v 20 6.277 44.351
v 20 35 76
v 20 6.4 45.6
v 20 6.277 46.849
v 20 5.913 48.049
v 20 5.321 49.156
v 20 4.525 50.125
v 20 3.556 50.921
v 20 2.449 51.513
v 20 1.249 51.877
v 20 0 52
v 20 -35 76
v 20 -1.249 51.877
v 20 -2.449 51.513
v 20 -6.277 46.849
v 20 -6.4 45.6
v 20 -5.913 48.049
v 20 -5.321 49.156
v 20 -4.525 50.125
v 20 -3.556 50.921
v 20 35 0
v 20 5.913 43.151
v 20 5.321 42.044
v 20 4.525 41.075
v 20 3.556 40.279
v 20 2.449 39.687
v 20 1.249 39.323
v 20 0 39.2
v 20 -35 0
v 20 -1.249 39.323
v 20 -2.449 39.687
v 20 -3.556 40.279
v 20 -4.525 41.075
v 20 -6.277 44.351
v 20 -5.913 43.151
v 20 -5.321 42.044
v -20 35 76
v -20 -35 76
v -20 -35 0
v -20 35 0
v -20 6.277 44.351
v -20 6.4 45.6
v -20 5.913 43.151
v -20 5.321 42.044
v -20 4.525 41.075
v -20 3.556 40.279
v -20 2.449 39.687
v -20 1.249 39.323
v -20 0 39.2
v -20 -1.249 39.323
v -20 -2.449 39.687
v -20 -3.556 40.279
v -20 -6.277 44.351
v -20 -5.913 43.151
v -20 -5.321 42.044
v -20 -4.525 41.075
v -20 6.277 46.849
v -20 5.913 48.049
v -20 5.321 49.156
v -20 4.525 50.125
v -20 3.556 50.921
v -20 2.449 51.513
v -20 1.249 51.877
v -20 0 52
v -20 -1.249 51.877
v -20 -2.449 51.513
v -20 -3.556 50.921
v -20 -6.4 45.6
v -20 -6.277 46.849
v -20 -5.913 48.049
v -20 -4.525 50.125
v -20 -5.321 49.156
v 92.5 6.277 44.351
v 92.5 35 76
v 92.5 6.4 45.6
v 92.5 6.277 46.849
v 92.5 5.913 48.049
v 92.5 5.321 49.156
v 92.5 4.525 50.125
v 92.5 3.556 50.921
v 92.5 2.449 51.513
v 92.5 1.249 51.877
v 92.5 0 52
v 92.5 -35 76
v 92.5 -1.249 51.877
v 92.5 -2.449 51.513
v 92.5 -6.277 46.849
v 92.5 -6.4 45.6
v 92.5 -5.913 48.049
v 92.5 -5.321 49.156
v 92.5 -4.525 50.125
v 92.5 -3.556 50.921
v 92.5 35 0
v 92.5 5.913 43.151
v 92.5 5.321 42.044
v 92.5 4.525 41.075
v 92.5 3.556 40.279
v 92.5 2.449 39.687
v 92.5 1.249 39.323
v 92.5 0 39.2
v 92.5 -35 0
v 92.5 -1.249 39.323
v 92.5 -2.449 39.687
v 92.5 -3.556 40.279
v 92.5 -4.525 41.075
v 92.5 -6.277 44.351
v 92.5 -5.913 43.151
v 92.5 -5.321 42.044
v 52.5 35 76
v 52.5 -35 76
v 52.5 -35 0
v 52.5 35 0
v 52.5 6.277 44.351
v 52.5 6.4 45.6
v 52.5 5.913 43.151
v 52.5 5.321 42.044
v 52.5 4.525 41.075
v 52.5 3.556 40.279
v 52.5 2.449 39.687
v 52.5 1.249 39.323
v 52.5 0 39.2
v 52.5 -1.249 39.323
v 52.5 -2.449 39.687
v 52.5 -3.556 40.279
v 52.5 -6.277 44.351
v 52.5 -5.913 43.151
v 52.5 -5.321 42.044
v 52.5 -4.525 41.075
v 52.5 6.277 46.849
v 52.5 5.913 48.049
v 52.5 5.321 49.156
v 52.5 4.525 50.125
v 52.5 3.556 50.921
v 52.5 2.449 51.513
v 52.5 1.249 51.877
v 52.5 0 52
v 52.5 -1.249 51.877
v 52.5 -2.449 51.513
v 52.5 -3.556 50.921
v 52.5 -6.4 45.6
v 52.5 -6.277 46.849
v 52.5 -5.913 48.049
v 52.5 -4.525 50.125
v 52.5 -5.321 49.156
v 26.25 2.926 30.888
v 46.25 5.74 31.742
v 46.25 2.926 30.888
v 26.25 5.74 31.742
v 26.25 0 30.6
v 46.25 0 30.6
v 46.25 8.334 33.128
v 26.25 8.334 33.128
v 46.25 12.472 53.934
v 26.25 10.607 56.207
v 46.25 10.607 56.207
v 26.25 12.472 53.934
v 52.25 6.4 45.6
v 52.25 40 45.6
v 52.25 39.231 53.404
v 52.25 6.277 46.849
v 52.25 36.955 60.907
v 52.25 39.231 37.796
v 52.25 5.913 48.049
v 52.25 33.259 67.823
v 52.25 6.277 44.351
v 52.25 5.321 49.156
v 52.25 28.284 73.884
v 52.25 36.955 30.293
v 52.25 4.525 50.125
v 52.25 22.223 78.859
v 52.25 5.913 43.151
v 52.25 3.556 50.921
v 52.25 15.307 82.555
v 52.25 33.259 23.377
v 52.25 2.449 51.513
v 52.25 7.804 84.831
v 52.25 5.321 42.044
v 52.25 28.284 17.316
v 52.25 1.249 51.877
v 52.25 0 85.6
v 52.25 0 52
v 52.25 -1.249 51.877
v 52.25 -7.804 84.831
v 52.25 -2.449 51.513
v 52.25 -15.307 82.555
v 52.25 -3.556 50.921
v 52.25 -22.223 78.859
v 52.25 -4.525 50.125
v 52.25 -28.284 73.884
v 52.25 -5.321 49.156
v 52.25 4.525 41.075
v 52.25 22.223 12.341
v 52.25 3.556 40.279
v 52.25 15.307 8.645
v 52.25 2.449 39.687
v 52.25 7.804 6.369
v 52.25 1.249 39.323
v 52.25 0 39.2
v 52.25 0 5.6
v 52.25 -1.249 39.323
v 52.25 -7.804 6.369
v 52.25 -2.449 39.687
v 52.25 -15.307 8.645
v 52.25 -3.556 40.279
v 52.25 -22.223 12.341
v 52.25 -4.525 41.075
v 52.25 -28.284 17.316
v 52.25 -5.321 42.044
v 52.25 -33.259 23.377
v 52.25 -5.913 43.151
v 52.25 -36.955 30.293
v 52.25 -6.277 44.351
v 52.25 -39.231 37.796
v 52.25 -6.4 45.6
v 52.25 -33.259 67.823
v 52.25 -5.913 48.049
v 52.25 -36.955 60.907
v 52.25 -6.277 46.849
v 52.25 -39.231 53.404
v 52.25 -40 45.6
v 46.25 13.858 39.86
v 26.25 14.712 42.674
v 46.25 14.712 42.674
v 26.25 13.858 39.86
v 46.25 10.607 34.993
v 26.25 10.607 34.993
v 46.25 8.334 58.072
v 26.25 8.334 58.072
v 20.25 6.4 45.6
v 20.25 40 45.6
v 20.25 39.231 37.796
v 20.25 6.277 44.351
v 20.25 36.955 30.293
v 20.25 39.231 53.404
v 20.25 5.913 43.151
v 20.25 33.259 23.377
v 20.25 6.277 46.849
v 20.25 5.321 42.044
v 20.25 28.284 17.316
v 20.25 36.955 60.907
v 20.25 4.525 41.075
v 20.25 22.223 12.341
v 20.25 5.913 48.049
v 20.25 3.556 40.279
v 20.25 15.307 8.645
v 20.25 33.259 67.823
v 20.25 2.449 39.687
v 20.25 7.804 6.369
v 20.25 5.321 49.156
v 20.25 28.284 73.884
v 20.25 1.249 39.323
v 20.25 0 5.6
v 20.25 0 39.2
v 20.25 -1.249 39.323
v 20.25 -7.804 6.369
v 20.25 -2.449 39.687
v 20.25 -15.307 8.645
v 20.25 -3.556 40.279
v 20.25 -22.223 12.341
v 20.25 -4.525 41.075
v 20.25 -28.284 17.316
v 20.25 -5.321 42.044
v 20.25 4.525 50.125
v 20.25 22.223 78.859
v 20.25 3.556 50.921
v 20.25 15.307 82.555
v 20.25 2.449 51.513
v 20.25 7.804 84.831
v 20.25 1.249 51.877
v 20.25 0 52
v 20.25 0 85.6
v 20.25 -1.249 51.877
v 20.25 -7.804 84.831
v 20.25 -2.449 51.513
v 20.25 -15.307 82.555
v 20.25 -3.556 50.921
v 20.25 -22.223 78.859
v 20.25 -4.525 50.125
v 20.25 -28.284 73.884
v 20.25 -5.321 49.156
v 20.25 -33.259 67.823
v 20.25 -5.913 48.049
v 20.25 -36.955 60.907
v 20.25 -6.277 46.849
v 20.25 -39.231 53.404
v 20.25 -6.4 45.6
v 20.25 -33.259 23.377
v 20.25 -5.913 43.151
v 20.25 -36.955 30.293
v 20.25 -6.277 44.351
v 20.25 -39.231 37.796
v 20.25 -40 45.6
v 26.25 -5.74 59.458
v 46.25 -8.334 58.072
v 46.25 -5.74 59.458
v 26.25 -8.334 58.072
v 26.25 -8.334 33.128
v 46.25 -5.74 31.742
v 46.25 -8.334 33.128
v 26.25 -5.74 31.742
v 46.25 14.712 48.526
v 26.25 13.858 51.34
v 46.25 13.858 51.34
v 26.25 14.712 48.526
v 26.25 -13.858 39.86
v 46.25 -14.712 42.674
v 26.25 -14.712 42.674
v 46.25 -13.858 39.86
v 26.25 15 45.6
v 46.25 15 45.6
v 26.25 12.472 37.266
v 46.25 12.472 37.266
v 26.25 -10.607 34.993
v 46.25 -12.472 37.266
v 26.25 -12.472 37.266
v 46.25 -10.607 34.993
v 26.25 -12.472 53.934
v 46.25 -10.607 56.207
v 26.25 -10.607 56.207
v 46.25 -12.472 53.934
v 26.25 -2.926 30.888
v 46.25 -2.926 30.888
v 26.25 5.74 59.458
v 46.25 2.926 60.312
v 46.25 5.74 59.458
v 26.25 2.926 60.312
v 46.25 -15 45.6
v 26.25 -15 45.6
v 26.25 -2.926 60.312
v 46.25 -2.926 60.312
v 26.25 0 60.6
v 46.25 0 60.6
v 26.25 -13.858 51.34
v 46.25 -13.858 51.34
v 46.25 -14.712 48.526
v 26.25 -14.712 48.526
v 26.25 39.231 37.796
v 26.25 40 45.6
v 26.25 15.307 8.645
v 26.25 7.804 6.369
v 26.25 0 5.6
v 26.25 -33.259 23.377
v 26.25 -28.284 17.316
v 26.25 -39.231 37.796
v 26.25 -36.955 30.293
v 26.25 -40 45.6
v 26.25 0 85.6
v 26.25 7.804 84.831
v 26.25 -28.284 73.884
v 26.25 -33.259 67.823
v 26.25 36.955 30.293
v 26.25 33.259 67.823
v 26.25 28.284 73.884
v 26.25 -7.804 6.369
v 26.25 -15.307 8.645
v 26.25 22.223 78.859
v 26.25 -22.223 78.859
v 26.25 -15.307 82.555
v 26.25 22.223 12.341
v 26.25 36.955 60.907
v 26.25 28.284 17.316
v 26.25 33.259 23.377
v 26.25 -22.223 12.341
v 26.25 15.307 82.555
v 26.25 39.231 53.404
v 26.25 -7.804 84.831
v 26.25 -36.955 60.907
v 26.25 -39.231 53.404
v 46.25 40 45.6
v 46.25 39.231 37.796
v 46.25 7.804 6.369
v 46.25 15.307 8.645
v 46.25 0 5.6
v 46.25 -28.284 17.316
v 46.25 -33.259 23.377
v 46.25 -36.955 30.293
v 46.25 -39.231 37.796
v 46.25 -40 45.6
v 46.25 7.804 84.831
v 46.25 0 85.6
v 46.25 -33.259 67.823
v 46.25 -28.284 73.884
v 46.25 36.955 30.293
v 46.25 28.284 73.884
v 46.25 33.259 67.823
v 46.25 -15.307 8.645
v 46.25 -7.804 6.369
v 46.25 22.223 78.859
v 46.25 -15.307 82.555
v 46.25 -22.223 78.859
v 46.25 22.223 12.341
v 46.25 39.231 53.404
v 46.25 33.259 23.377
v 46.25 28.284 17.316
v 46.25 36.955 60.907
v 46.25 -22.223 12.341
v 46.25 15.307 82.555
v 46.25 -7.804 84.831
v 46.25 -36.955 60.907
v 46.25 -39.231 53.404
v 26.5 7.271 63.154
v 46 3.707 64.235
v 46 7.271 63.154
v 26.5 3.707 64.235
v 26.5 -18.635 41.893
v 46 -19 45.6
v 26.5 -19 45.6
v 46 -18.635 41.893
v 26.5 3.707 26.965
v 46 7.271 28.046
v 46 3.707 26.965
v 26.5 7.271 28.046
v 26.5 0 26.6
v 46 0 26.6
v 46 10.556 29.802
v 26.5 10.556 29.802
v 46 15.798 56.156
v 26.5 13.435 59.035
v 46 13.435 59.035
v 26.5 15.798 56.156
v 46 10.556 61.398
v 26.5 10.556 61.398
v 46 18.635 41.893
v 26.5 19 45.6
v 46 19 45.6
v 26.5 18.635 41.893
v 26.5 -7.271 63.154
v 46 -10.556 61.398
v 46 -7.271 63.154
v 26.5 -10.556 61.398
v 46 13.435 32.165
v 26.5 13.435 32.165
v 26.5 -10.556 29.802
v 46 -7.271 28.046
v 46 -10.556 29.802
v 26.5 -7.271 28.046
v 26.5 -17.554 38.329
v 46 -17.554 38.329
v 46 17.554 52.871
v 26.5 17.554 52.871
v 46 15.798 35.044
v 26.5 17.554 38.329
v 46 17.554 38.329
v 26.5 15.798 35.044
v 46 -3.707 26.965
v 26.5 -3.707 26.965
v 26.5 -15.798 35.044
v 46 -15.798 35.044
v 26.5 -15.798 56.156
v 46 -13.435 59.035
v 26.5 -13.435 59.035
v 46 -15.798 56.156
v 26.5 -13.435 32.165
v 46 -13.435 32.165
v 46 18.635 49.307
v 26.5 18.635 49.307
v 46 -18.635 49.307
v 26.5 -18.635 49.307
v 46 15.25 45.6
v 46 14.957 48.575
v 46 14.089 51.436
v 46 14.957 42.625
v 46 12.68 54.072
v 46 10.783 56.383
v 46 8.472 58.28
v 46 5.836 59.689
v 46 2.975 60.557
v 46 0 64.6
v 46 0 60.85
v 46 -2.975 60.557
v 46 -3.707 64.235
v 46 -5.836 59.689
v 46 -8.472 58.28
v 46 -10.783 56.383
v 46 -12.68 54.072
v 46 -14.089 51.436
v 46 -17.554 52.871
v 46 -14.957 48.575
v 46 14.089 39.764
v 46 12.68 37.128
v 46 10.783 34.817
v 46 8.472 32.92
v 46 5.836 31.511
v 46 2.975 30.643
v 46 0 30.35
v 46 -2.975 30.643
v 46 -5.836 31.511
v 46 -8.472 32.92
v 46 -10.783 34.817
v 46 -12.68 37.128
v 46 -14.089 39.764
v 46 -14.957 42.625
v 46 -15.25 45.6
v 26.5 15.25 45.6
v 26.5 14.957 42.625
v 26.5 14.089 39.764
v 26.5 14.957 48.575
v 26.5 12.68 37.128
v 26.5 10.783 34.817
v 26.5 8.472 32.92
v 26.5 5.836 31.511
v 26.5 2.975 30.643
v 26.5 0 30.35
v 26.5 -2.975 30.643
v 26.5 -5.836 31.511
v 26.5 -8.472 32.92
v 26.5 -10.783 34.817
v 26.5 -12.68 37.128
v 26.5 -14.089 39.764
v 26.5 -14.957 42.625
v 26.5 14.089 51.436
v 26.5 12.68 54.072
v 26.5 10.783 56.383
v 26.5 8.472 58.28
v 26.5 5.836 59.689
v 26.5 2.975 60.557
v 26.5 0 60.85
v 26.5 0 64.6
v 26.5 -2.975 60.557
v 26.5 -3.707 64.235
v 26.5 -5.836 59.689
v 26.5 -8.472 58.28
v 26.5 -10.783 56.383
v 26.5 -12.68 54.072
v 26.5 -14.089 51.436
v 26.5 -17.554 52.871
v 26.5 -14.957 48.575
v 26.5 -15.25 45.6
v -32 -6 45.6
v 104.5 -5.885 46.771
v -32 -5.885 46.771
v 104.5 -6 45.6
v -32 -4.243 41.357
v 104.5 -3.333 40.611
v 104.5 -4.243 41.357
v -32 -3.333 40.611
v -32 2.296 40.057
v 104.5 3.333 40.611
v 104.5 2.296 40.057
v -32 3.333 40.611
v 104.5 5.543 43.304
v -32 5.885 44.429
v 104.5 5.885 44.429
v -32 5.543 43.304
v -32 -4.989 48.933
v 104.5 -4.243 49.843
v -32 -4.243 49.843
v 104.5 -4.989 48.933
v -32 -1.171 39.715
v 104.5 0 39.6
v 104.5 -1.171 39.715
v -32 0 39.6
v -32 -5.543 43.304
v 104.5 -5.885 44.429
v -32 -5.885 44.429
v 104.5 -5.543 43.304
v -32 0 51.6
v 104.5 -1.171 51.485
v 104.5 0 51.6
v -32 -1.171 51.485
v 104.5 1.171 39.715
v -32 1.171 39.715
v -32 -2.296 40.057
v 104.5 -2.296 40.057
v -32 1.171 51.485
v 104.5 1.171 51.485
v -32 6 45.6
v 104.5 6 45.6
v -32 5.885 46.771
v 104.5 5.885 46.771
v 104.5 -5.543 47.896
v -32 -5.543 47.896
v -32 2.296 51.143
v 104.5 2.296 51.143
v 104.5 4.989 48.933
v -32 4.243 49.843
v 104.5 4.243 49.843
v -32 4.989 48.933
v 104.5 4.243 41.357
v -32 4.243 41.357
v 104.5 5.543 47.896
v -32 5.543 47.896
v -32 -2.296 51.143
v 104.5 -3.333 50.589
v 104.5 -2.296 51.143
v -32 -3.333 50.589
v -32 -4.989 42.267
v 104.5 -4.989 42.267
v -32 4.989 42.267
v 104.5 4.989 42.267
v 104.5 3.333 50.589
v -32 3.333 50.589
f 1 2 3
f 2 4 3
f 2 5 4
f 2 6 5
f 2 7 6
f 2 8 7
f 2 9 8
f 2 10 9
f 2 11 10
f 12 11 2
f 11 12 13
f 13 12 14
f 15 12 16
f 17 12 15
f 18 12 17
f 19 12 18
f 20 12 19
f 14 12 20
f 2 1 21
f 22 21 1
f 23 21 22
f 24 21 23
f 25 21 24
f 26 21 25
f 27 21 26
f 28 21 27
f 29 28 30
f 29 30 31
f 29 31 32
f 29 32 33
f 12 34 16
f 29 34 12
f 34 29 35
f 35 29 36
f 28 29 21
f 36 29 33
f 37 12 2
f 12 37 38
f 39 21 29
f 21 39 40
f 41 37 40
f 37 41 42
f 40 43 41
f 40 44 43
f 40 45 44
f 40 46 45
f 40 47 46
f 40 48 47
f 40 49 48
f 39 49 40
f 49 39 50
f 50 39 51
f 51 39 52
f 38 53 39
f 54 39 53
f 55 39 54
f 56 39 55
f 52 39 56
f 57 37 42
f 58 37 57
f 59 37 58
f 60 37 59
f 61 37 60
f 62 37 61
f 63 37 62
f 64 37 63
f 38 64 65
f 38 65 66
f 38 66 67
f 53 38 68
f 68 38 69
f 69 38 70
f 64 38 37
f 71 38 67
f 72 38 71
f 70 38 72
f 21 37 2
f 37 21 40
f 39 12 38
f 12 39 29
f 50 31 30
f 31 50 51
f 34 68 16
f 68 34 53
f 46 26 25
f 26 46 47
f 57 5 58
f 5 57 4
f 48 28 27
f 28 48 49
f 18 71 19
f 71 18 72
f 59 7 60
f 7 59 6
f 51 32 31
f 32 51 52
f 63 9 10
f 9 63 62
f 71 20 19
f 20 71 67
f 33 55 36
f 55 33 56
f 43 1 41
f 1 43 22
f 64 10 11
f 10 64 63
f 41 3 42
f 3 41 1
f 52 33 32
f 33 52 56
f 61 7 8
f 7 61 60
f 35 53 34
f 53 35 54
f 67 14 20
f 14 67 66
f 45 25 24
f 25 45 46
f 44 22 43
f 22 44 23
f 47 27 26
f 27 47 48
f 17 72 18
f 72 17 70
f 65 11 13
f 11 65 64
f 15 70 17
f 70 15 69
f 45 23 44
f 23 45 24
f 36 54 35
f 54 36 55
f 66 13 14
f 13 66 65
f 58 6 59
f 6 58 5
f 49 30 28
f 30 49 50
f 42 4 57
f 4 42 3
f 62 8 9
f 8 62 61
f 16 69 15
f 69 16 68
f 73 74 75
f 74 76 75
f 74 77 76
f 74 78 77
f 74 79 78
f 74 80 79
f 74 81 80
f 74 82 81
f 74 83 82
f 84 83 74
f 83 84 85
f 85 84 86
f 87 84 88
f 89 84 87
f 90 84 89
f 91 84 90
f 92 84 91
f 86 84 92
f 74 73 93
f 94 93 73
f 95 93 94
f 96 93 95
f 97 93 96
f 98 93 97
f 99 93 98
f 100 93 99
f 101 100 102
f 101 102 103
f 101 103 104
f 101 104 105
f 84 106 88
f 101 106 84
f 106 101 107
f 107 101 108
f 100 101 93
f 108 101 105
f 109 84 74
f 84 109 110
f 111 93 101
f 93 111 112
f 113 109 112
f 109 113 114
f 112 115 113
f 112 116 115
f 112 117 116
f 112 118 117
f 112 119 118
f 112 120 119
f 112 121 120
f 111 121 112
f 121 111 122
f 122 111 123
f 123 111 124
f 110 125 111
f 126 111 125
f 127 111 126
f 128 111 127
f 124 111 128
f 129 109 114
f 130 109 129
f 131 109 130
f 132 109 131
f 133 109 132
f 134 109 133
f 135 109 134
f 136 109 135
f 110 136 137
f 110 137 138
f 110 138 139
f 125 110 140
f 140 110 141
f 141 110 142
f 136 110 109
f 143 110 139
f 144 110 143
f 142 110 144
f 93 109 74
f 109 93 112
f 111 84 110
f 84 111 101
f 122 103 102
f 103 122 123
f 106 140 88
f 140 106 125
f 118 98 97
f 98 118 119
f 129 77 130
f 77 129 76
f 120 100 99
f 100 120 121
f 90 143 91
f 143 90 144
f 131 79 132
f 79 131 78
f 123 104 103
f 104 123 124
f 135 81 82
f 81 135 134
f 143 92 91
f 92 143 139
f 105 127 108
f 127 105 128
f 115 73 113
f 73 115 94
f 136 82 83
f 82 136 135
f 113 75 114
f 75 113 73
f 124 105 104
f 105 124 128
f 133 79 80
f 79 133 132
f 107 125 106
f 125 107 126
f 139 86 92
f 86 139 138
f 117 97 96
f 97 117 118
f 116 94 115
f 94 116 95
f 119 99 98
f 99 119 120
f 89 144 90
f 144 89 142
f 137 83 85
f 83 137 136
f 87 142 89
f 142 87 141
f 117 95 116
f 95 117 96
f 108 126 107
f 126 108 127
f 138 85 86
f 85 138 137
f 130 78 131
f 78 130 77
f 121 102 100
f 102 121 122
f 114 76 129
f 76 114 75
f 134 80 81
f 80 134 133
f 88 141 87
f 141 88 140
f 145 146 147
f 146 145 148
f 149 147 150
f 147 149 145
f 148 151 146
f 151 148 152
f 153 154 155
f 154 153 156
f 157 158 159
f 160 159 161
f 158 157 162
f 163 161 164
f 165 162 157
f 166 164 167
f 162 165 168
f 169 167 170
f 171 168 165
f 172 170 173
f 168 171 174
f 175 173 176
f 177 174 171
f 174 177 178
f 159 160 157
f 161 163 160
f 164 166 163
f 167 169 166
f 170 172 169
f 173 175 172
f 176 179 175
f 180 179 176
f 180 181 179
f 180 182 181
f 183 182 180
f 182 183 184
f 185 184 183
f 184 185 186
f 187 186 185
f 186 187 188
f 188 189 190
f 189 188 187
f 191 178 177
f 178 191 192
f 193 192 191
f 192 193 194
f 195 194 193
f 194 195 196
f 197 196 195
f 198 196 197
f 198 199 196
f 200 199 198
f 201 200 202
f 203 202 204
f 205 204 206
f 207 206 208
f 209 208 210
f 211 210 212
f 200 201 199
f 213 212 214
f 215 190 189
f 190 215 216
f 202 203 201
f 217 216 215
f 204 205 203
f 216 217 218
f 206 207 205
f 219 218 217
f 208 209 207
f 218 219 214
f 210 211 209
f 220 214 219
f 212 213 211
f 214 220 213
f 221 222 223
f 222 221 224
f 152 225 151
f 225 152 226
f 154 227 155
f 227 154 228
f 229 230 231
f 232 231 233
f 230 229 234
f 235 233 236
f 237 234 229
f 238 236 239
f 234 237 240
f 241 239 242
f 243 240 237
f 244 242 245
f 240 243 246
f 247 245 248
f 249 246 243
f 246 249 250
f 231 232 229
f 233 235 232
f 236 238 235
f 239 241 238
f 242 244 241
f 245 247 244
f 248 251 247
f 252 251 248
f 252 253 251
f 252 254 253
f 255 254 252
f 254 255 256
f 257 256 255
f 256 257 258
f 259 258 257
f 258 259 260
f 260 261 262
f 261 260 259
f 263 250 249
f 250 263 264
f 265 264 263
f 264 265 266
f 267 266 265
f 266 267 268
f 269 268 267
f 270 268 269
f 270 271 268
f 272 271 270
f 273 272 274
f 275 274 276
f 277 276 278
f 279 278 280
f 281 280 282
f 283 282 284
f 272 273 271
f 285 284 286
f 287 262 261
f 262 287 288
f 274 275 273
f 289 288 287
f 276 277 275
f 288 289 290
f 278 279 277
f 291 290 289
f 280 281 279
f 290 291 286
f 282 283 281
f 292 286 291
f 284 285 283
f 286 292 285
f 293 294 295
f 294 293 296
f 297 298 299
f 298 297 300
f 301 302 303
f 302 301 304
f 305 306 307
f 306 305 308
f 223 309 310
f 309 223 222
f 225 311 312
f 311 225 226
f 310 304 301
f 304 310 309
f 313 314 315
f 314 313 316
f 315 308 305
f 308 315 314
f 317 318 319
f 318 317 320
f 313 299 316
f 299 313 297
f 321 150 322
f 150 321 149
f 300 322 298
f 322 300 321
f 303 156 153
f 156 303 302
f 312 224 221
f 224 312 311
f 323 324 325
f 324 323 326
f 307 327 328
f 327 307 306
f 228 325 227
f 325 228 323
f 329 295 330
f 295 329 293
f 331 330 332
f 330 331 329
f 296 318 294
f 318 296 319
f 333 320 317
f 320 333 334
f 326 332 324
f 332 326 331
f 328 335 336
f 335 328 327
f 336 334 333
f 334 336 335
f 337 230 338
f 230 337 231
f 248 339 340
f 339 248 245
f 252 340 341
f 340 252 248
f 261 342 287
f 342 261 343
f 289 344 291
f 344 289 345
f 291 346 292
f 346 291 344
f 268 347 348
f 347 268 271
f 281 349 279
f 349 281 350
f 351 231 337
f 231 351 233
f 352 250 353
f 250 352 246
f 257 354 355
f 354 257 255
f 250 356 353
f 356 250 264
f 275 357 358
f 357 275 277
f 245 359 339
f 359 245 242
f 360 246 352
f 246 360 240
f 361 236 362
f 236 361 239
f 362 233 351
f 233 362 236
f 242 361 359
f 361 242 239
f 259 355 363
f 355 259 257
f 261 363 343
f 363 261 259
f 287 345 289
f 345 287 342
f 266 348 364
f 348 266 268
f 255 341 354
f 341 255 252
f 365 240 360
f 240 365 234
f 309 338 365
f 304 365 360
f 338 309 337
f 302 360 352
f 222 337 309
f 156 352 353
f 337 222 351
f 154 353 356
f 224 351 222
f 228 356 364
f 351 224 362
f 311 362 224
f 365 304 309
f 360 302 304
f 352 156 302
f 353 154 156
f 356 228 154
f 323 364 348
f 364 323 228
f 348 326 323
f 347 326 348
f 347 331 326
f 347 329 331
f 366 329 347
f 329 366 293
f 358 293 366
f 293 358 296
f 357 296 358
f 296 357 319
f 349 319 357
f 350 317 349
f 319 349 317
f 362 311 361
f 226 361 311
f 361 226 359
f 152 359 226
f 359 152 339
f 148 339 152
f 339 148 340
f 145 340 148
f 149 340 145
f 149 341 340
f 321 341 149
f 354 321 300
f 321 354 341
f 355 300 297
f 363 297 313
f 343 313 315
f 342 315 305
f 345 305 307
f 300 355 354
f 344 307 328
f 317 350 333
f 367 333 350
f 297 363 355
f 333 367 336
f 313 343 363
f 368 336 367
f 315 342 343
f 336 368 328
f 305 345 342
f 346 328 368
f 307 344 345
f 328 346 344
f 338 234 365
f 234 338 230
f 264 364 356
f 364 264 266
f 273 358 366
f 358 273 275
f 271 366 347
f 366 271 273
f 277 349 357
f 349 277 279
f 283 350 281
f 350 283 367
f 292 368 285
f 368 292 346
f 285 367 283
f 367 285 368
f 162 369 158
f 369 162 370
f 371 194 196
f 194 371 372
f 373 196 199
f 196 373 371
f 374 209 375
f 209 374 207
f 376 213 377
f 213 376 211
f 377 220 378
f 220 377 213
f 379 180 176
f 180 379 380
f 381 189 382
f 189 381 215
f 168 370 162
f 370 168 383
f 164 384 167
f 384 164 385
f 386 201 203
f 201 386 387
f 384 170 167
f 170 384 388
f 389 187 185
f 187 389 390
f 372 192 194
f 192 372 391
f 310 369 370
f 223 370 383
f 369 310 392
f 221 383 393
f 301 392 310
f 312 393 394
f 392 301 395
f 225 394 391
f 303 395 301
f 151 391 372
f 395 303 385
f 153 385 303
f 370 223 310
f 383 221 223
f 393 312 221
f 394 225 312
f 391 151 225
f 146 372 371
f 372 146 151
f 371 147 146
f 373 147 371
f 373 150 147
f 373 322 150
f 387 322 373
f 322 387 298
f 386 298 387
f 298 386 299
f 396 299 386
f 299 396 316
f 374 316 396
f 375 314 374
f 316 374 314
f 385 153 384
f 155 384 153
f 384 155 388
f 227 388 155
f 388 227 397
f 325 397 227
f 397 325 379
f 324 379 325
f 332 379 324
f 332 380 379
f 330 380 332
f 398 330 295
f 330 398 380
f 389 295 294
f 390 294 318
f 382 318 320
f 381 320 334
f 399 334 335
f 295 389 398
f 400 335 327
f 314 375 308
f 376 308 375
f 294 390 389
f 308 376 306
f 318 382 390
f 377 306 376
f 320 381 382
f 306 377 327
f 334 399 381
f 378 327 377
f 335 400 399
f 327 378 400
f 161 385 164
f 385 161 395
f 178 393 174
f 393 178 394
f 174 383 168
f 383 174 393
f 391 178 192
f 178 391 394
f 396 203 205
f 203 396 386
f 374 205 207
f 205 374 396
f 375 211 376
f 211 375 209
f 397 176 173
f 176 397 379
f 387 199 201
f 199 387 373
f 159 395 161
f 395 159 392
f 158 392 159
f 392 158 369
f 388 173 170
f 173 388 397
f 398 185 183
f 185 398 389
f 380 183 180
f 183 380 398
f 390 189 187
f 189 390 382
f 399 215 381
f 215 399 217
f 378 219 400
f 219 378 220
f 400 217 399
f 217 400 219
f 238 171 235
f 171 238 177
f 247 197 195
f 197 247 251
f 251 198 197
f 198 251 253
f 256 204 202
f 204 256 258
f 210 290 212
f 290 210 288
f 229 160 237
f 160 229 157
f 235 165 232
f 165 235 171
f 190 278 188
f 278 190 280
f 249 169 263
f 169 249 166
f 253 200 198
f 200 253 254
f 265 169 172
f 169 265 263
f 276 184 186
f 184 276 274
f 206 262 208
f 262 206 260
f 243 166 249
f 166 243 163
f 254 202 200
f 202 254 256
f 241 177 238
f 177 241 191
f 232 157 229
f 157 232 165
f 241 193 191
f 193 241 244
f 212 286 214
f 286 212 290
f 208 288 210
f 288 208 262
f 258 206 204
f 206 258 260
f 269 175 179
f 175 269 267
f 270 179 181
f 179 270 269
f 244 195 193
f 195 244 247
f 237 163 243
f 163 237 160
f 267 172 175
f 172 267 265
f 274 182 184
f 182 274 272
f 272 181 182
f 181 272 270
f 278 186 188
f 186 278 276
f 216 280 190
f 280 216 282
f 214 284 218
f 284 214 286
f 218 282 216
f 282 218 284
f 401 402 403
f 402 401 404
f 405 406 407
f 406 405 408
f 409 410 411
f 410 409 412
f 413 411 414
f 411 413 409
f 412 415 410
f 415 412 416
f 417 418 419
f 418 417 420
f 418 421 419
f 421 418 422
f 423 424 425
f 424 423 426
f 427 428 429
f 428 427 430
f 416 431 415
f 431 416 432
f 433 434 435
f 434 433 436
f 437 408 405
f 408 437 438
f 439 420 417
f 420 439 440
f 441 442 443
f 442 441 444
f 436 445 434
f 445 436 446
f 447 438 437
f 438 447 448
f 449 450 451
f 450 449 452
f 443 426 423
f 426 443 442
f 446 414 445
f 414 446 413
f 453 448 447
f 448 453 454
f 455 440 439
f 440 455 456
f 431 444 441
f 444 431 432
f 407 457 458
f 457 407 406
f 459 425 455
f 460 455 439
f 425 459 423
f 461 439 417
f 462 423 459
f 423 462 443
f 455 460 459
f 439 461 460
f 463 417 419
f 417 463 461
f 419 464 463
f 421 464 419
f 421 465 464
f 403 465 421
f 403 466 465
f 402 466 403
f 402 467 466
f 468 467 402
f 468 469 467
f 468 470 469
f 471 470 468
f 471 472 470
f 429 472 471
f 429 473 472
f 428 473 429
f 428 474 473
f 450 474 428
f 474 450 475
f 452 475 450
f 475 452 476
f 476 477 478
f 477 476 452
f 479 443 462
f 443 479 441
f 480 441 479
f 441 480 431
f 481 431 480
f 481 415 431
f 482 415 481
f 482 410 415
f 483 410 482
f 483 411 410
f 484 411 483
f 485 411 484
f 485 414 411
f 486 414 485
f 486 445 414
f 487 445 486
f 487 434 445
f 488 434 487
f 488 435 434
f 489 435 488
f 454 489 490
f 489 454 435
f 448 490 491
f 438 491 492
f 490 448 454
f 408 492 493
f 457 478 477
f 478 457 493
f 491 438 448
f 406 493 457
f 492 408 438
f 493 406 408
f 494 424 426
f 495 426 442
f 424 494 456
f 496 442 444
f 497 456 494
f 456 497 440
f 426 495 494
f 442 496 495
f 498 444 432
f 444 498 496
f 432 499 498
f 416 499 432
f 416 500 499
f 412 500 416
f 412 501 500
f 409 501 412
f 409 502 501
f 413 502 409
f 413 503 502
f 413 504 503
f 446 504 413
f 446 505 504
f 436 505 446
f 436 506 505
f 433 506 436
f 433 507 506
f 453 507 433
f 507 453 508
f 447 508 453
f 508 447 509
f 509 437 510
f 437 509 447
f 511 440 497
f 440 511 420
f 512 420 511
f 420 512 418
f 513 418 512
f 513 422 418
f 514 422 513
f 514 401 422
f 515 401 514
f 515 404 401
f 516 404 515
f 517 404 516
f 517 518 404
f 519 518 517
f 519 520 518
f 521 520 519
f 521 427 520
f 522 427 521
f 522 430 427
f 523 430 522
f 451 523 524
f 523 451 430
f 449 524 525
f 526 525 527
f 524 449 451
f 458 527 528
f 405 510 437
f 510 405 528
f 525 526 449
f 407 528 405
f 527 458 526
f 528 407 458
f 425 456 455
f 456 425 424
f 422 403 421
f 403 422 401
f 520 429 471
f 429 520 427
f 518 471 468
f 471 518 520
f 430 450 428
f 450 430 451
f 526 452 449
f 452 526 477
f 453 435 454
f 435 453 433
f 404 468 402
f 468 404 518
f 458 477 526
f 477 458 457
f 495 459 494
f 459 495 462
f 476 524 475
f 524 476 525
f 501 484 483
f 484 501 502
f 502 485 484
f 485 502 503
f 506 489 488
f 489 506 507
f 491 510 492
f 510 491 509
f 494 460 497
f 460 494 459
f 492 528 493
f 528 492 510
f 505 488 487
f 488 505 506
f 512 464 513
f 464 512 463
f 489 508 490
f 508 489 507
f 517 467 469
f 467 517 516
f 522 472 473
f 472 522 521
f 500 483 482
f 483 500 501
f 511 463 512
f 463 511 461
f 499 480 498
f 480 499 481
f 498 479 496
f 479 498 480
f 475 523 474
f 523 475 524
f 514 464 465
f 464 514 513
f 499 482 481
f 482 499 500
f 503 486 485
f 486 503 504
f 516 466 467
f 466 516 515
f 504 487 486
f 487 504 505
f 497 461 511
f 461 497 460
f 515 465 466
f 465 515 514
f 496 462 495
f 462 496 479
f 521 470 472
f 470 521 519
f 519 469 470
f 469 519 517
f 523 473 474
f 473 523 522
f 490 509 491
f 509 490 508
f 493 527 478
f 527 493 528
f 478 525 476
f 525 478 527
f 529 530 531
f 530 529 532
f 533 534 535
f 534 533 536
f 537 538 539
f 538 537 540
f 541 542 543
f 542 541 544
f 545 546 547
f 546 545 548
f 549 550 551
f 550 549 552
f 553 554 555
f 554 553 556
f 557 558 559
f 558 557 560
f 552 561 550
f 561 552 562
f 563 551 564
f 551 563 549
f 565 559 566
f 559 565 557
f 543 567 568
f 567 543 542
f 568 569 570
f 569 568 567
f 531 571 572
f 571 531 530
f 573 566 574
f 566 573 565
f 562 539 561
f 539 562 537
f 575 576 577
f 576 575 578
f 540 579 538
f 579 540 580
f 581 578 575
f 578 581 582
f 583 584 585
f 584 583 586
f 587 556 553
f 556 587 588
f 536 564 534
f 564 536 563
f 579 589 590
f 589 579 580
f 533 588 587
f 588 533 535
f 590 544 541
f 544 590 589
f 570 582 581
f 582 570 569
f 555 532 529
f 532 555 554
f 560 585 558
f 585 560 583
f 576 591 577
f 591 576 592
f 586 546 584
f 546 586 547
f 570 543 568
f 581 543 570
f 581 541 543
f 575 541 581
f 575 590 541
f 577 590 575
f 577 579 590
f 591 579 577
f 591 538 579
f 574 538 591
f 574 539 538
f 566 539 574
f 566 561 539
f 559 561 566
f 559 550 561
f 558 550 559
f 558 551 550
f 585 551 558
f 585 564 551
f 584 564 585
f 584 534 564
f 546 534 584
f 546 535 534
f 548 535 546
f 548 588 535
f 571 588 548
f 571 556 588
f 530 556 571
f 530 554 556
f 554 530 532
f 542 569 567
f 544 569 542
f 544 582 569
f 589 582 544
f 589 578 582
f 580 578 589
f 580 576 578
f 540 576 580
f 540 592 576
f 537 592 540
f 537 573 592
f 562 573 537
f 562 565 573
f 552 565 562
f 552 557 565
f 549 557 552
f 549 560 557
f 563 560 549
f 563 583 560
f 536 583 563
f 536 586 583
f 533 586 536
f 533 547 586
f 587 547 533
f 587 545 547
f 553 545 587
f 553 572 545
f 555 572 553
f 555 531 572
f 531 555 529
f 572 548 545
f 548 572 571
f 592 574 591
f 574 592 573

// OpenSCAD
$fn = 32;

// ------------------------------------------------------------------------
// Pulley assembly: d80 pulley with a belt, shaft d12
// Every part is its own module, assembly() places them once.
// ------------------------------------------------------------------------

// --- part 1 ---
module support1() {
  difference() {
    translate([-20, -35, 0]) cube([40, 70, 76]);
    translate([0, 0, 45.6]) rotate([0, 90, 0]) cylinder(h = 42, d = 12.8, center = true);
  }
}

// --- part 2 ---
module support2() {
  difference() {
    translate([-20, -35, 0]) cube([40, 70, 76]);
    translate([0, 0, 45.6]) rotate([0, 90, 0]) cylinder(h = 42, d = 12.8, center = true);
  }
}

// --- part 3 ---
module shaft() {
  translate([0, 0, -68.25]) cylinder(h = 136.5, d = 12);
}

// --- part 4 ---
module pulley() {
  difference() {
    union() {
      cylinder(h = 32, d = 30);
      cylinder(h = 6, d = 80);
      translate([0, 0, 26]) cylinder(h = 6, d = 80);
    }
    translate([0, 0, -1]) cylinder(h = 34, d = 12.8);
  }
}

// --- part 5 ---
module belt() {
  difference() {
      translate([0, 0, 0]) cylinder(h = 19.5, d = 38);
      translate([0, 0, -1]) cylinder(h = 21.5, d = 30.5);
    }
}

// --- assembly ---
module assembly() {
  translate([0, 0, 0]) rotate([0, 0, 0]) support1();
  translate([72.5, 0, 0]) rotate([0, 0, 0]) support2();
  translate([36.25, 0, 45.6]) rotate([0, 90, 0]) shaft();
  translate([20.25, 0, 45.6]) rotate([0, 90, 0]) pulley();
  translate([26.5, 0, 45.6]) rotate([0, 90, 0]) belt();
}

assembly();
